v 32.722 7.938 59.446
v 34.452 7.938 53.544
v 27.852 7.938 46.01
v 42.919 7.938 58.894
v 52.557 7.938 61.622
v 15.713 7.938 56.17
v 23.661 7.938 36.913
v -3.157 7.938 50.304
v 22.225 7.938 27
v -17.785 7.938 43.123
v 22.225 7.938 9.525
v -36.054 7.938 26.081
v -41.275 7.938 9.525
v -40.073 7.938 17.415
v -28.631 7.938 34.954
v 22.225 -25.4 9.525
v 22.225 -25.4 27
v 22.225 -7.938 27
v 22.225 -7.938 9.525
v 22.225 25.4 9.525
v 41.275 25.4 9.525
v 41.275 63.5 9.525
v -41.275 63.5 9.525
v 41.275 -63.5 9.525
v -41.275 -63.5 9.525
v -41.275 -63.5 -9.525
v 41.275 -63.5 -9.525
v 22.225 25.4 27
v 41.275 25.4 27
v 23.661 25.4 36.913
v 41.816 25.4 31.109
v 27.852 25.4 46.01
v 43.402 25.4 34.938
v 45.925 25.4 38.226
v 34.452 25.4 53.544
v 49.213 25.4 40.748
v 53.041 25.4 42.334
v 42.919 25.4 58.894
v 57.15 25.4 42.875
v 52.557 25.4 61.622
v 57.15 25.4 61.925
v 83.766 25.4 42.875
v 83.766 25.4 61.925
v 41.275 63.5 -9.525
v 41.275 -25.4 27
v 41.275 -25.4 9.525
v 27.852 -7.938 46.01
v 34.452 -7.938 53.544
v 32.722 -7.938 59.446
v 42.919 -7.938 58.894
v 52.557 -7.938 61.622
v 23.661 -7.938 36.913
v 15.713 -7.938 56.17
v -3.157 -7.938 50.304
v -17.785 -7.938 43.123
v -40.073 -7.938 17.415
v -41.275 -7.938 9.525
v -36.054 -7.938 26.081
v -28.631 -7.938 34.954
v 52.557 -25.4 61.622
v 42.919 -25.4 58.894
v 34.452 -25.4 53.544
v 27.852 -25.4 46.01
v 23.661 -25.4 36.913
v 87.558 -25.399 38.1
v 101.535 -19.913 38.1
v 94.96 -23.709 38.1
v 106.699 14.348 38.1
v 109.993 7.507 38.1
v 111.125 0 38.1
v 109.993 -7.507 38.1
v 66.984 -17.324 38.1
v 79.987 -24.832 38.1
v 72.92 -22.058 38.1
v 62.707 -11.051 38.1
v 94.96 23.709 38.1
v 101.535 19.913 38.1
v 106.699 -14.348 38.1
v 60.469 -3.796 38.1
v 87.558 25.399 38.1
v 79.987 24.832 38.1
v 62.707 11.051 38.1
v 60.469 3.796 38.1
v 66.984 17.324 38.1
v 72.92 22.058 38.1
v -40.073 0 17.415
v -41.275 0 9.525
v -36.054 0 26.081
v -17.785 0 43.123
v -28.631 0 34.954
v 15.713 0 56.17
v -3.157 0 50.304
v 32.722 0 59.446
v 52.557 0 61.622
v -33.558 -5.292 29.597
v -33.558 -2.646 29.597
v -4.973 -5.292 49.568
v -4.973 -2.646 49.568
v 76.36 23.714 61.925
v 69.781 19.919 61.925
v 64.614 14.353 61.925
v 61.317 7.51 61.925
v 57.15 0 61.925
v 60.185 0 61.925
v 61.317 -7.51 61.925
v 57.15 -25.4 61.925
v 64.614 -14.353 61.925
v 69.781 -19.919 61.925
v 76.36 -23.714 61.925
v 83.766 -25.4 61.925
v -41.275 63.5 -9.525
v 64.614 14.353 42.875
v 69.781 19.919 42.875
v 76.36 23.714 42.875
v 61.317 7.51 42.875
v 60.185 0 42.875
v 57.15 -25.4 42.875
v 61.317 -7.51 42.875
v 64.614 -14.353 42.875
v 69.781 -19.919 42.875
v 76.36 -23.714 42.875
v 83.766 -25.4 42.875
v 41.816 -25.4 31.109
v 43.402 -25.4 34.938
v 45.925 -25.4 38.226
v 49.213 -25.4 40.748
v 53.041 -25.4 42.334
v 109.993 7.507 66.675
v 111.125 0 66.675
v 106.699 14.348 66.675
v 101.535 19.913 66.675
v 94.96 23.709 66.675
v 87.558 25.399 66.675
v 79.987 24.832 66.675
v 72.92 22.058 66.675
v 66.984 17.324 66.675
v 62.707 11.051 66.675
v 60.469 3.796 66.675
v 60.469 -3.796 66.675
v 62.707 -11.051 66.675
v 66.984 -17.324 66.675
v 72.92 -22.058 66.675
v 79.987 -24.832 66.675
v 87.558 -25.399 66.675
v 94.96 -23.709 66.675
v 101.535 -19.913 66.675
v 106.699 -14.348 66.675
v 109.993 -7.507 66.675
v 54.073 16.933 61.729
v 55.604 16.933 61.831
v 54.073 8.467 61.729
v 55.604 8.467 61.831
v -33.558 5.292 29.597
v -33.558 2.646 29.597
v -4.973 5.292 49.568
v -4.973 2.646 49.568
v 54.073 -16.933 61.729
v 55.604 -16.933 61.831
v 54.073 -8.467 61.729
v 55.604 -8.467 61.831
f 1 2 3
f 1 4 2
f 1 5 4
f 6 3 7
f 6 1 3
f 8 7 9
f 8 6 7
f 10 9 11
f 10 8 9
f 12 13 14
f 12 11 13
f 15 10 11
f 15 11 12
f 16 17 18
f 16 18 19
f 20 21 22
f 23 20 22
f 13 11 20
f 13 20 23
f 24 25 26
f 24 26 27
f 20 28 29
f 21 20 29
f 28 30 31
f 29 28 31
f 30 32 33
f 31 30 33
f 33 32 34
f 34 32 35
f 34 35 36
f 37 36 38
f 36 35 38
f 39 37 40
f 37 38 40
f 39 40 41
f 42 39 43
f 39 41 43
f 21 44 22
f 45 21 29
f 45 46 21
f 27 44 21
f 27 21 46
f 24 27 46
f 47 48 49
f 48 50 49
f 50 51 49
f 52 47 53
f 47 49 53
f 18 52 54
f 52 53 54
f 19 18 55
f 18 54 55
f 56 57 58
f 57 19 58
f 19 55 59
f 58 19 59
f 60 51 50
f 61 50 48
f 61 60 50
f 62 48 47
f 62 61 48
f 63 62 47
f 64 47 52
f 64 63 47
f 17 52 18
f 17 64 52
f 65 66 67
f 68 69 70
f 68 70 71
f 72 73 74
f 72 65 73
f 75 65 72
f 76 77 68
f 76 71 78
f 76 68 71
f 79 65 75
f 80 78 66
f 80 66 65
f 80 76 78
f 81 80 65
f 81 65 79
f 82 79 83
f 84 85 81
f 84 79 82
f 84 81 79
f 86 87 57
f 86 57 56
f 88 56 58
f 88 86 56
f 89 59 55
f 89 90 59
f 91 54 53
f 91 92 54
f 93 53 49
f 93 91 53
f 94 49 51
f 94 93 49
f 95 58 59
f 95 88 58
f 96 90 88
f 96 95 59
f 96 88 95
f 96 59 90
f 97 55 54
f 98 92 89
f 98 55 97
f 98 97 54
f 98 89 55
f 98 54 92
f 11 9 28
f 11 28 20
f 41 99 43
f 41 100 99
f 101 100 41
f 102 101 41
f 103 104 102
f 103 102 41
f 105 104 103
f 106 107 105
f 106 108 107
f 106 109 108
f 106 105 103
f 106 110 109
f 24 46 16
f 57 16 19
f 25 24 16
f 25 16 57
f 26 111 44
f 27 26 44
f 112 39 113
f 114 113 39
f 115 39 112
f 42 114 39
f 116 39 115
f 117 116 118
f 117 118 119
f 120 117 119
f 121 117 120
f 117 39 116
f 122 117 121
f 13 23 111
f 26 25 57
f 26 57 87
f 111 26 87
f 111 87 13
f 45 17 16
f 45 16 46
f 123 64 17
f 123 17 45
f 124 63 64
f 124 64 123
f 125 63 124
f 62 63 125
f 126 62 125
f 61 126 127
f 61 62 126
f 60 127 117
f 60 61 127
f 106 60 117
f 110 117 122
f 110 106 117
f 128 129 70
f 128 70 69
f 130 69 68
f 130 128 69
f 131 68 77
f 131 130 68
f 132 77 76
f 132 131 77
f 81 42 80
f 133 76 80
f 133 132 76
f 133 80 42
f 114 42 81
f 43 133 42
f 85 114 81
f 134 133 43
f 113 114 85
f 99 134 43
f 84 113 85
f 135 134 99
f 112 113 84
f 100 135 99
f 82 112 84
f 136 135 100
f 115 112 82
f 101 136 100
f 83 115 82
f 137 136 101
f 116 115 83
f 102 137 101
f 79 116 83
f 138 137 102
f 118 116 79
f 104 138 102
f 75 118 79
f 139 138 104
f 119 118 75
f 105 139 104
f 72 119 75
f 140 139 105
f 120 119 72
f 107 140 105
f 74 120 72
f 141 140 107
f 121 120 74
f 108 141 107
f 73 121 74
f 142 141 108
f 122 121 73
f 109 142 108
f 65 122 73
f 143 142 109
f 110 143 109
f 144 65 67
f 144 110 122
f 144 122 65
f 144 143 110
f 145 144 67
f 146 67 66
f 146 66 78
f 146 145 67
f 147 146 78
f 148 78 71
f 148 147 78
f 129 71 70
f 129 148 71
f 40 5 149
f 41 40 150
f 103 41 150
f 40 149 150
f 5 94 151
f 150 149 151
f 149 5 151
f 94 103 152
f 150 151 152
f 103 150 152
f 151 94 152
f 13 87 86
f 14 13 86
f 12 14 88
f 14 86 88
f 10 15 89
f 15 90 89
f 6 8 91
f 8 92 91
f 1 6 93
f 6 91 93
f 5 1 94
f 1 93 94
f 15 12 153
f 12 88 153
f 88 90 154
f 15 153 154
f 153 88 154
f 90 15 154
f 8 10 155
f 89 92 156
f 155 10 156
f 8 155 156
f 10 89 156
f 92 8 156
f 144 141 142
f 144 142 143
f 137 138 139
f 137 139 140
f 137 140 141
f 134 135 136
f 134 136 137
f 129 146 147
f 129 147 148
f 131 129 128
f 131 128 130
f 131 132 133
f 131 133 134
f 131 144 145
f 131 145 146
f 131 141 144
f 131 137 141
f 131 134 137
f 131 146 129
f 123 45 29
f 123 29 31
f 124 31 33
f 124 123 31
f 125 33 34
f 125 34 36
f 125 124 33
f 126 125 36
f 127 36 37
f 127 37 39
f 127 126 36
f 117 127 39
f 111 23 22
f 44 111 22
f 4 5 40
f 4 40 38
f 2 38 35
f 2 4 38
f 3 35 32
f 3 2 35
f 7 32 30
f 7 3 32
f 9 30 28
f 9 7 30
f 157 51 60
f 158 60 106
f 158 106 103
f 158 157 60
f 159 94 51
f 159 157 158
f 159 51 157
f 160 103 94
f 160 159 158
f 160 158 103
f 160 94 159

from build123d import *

# Parameters (mm, degrees)
F1_DEPTH = 63.5
F0_W     = 25.3298562567
F0_H     = 19.05
F2_DEPTH = 25.4
F3_DEPTH = 7.9375


with BuildPart() as f1:
    # F0 (on Front) → F1 (new body, symmetric)
    with BuildSketch(Plane.XZ):
        Polygon((-41.275, 9.525), (-41.275, -9.525), (41.275, -9.525), (41.275, 9.525), (22.225, 9.525), align=None)
    extrude(amount=F1_DEPTH, both=True)

    # F0 (on Front) → F2 (join, symmetric)
    with BuildSketch(Plane.XZ):
        with BuildLine():
            Line((22.225, 9.525), (41.275, 9.525))
            Line((41.275, 9.525), (41.275, 27.0002))
            ThreePointArc((41.275, 27.0002), (45.9246798487, 38.2255201513), (57.15, 42.8752))
            Line((57.15, 42.8752), (60.325, 42.8752))
            Line((60.325, 42.8752), (60.325, 61.9252))
            Line((60.325, 61.9252), (57.15, 61.9252))
            add(Edge.make_bspline(
                [(52.5566804935, 61.6218267803), (54.0650417221, 61.7326720686), (55.596048457, 61.833893026), (57.15, 61.9252)],
                knots=[109.2974079023, 109.2974079023, 109.2974079023, 109.2974079023, 111.5045361635, 111.5045361635, 111.5045361635, 111.5045361635], degree=3))
            ThreePointArc((52.5566804935, 61.6218267803), (30.8804614738, 50.0146947939), (22.225, 27.0002))
            Line((22.225, 27.0002), (22.225, 9.525))
        make_face()
        with Locations((72.9899281284, 52.4002)):
            Rectangle(F0_W, F0_H)
    extrude(amount=F2_DEPTH, both=True)

    # F0 (on Front) → F3 (join, symmetric)
    with BuildSketch(Plane.XZ):
        with BuildLine():
            add(Edge.make_bspline(
                [(-41.275, 9.525), (-41.2995623579, 27.0424108455), (-22.1376521166, 56.1327471898), (52.5566804935, 61.6218267803)],
                knots=[0, 0, 0, 0, 109.2974079023, 109.2974079023, 109.2974079023, 109.2974079023], degree=3))
            Line((-41.275, 9.525), (22.225, 9.525))
            Line((22.225, 9.525), (22.225, 27.0002))
            ThreePointArc((22.225, 27.0002), (30.8804614738, 50.0146947939), (52.5566804935, 61.6218267803))
        make_face()
    extrude(amount=F3_DEPTH, both=True)

    # F0 (on Front) → F4 (revolve)
    with BuildSketch(Plane.XZ):
        Polygon((85.6548562567, 66.675), (85.6548562567, 61.9252), (85.6548562567, 42.8752), (85.6548562567, 38.1), (111.125, 38.1), (111.125, 66.675), align=None)
    revolve(axis=Axis((85.6548562567, 0, 52.3875), (0, 0, 1)))


solid = f1.part
